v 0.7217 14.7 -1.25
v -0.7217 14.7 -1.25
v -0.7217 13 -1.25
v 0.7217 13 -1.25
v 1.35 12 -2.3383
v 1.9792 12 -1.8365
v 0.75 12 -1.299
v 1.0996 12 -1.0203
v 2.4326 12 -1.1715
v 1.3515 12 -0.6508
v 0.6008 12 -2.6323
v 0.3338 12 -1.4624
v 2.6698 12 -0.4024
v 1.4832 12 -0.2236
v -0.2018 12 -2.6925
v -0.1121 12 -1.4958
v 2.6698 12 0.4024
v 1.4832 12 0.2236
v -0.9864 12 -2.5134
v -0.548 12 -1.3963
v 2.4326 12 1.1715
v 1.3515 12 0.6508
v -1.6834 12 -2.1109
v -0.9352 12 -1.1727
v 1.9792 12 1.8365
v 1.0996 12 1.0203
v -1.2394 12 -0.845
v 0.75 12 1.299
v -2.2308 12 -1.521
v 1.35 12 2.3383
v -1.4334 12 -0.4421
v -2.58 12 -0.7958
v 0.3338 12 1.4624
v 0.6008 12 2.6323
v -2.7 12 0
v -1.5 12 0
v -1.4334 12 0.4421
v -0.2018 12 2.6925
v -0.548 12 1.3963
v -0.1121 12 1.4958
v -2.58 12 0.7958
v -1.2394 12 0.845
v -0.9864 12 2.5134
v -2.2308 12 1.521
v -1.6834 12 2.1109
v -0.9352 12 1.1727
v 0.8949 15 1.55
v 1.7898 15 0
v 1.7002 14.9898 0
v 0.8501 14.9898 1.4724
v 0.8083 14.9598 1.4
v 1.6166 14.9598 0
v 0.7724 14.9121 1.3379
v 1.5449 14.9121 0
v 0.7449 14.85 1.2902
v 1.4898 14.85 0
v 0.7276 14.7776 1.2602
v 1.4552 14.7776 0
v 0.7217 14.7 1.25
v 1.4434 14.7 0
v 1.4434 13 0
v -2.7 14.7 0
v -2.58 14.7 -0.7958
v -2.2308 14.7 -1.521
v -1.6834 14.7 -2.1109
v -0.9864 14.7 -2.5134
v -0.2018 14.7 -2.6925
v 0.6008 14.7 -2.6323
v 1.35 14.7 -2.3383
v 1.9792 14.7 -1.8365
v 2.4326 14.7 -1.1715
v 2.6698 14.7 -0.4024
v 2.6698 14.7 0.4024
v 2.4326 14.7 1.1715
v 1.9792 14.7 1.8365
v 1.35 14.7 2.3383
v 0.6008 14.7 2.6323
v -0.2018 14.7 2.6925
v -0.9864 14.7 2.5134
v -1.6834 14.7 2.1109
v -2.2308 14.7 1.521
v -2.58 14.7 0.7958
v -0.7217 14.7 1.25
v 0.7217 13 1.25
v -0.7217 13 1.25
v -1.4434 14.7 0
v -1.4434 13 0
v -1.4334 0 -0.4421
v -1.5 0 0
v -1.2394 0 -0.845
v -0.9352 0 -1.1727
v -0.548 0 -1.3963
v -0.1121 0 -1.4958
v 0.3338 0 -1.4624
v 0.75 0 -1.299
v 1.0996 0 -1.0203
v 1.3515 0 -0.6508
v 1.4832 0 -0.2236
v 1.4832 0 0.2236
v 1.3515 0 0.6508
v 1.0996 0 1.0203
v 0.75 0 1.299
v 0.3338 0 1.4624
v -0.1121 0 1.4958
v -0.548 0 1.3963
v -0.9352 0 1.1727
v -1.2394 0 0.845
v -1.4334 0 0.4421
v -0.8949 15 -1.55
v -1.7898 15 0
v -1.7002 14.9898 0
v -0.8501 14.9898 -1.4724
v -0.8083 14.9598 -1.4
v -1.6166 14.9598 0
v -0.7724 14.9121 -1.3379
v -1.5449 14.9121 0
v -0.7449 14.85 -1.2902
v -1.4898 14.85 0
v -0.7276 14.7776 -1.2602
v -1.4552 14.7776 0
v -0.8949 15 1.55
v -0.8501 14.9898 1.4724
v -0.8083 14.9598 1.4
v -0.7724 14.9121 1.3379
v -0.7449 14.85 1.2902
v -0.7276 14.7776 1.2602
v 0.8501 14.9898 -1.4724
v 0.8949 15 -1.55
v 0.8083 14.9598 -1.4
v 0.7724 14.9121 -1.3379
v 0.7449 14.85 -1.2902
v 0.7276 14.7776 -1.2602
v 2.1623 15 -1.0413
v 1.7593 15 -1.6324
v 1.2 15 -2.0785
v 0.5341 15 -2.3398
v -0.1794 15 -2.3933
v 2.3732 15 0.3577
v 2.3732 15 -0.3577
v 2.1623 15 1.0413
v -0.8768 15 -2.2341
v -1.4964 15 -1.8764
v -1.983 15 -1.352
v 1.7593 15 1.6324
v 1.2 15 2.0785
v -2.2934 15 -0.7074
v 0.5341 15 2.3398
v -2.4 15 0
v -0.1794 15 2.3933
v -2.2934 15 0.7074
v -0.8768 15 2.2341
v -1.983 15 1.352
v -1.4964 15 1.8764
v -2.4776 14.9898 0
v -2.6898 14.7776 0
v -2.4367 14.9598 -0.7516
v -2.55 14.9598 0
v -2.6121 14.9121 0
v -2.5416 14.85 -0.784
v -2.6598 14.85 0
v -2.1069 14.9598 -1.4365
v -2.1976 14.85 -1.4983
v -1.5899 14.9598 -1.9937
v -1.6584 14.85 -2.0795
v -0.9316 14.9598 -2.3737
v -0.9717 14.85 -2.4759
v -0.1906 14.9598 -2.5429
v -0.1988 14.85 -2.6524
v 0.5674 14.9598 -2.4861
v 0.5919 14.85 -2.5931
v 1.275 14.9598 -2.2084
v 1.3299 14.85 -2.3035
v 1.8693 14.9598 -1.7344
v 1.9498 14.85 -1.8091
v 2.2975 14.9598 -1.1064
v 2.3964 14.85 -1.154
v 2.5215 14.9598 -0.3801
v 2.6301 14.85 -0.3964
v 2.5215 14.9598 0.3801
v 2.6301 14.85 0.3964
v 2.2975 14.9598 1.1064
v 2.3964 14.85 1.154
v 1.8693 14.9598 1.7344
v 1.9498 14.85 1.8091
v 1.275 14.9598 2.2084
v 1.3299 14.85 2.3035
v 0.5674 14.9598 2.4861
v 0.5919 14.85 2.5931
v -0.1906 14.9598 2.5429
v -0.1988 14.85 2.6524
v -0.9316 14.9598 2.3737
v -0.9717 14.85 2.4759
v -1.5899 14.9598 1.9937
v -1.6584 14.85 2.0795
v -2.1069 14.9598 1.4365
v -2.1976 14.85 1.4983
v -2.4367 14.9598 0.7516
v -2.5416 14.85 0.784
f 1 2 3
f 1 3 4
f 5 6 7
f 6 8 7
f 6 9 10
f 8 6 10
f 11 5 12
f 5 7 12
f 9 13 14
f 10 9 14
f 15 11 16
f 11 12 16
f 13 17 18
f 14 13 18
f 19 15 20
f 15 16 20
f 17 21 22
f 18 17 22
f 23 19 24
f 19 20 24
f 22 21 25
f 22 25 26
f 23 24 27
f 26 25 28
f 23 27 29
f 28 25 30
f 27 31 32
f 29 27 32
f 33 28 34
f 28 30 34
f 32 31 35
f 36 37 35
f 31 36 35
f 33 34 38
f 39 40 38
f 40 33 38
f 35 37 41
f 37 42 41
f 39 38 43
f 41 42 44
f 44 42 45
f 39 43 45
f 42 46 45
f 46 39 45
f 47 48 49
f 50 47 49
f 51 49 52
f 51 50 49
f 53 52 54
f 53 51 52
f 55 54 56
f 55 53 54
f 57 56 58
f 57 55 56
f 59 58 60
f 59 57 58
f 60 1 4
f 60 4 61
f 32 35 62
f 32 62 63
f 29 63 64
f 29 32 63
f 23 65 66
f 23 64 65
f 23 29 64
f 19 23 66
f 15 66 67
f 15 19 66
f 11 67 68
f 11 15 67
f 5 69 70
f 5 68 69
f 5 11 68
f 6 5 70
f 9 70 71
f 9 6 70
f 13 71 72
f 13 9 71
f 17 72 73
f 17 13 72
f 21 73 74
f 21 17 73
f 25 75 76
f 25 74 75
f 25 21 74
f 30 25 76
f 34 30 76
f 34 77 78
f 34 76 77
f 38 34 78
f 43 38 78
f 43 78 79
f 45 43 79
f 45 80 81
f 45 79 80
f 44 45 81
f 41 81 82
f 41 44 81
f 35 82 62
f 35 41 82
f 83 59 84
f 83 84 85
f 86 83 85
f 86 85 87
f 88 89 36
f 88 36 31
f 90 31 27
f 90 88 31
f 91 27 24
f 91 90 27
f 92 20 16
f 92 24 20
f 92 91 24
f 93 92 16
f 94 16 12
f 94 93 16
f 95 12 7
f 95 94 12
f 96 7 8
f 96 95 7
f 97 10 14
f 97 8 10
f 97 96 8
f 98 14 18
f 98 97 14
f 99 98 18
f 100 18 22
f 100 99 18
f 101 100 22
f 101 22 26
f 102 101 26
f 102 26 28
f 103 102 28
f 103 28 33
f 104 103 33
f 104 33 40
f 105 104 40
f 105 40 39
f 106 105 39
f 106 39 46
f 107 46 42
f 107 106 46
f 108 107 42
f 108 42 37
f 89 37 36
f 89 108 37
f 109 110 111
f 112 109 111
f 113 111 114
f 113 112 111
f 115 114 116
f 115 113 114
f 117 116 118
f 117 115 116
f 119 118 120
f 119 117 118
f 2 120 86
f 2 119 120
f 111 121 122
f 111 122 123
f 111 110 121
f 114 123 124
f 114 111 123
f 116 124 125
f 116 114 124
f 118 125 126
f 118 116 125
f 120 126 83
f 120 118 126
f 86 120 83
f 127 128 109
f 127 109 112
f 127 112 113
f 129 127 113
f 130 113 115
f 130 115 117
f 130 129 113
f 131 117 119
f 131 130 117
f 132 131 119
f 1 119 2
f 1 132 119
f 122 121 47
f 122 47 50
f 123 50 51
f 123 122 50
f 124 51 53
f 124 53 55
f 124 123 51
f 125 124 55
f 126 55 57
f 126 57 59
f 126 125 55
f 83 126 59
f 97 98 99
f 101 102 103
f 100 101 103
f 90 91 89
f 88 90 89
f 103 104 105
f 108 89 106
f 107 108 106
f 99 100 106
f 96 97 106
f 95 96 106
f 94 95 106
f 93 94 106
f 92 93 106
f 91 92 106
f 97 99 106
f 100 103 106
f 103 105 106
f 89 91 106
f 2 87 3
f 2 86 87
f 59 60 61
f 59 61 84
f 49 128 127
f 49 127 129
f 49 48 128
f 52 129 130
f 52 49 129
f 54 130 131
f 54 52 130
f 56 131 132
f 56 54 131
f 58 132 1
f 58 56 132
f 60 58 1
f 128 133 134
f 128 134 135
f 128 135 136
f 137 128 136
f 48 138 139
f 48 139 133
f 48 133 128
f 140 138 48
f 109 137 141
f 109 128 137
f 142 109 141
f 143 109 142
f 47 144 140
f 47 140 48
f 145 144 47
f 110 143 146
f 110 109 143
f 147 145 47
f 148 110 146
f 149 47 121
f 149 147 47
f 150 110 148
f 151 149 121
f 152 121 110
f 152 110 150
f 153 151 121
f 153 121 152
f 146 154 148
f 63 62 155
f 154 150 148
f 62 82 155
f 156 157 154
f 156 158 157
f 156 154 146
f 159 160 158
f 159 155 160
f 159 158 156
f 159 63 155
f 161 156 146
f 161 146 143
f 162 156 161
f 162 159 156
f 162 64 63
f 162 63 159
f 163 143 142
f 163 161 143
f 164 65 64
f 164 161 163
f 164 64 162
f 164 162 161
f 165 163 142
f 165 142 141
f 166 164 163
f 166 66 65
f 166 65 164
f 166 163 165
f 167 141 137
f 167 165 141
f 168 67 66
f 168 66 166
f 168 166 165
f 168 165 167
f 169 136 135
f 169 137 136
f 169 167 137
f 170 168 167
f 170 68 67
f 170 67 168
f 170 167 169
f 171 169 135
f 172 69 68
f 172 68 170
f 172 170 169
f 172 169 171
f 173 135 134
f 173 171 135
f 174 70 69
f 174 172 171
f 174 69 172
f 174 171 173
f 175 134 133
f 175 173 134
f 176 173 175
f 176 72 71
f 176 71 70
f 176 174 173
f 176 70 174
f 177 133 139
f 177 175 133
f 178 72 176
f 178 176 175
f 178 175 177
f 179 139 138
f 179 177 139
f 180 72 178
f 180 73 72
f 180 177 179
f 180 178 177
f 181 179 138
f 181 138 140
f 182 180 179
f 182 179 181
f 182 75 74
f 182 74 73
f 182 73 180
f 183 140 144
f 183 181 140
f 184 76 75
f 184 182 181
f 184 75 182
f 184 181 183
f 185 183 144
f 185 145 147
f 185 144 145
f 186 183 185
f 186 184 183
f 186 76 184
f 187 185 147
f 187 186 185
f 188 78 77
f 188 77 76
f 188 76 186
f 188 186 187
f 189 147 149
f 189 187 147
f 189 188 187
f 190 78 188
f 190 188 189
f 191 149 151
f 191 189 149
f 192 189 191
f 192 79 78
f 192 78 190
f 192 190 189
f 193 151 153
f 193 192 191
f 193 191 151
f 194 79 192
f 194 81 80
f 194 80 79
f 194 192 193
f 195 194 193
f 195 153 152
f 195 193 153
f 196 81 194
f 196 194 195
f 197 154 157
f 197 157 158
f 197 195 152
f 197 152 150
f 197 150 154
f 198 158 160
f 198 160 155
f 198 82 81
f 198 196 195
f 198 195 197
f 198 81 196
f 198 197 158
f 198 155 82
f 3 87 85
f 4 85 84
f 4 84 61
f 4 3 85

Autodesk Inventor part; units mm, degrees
ref_plane "YZ Plane" through (0, 0, 0) normal (1, 0, 0) x (0, 1, 0)
ref_plane "XZ Plane" through (0, 0, 0) normal (0, 1, 0) x (-1, 0, 0)
ref_plane "XY Plane" through (0, 0, 0) normal (0, 0, 1) x (1, 0, 0)
sketch "Sketch1" plane through (0, 0, 0) normal (0, 0, 1) x (1, 0, 0)
  line L0 (0, 0) -> (0, 15)
  line L1 (0, 15) -> (-2.7, 15)
  line L2 (-2.7, 15) -> (-2.7, 12)
  line L3 (-2.7, 12) -> (-1.5, 12)
  line L4 (-1.5, 12) -> (-1.5, 0)
  line L5 (-1.5, 0) -> (0, 0)
  dimension "d0" = 12
  dimension "d1" = 3
  dimension "d2" = 1.5
  dimension "d3" = 2.7
revolve "Revolution1" add sketch "Sketch1" angle 360 about axis through (0, 0, 0) along (0, 1, 0)
sketch "Sketch2" plane through (0, 15, 0) normal (0, 1, 0) x (1, 0, 0)
  line L0 (-0.7217, -1.25) -> (-1.4434, 0)
  line L1 (-1.4434, 0) -> (-0.7217, 1.25)
  line L2 (-0.7217, 1.25) -> (0.7217, 1.25)
  line L3 (0.7217, 1.25) -> (1.4434, 0)
  line L4 (1.4434, 0) -> (0.7217, -1.25)
  line L5 (0.7217, -1.25) -> (-0.7217, -1.25)
  point P0 (0, 0)
  point P1 (0, 0)
  dimension "d5" = 2.5
extrude "Extrusion1" cut sketch "Sketch2" against normal blind 2
fillet "Fillet1" radius 0.3 6 edges at (0, 15, -1.25) (1.0825, 15, -0.625) (1.0825, 15, 0.625) (0, 15, 1.25) (-1.0825, 15, 0.625) (-1.0825, 15, -0.625)
fillet "Fillet2" radius 0.3 1 edges at (2.7, 15, 0)
thread "Thread1" size "M3x0.5" class "6g" standard "ANSI Metric M Profile" length 11.5
properties part number "Screw_M4X12_SS_HEX" material "Stainless Steel"
